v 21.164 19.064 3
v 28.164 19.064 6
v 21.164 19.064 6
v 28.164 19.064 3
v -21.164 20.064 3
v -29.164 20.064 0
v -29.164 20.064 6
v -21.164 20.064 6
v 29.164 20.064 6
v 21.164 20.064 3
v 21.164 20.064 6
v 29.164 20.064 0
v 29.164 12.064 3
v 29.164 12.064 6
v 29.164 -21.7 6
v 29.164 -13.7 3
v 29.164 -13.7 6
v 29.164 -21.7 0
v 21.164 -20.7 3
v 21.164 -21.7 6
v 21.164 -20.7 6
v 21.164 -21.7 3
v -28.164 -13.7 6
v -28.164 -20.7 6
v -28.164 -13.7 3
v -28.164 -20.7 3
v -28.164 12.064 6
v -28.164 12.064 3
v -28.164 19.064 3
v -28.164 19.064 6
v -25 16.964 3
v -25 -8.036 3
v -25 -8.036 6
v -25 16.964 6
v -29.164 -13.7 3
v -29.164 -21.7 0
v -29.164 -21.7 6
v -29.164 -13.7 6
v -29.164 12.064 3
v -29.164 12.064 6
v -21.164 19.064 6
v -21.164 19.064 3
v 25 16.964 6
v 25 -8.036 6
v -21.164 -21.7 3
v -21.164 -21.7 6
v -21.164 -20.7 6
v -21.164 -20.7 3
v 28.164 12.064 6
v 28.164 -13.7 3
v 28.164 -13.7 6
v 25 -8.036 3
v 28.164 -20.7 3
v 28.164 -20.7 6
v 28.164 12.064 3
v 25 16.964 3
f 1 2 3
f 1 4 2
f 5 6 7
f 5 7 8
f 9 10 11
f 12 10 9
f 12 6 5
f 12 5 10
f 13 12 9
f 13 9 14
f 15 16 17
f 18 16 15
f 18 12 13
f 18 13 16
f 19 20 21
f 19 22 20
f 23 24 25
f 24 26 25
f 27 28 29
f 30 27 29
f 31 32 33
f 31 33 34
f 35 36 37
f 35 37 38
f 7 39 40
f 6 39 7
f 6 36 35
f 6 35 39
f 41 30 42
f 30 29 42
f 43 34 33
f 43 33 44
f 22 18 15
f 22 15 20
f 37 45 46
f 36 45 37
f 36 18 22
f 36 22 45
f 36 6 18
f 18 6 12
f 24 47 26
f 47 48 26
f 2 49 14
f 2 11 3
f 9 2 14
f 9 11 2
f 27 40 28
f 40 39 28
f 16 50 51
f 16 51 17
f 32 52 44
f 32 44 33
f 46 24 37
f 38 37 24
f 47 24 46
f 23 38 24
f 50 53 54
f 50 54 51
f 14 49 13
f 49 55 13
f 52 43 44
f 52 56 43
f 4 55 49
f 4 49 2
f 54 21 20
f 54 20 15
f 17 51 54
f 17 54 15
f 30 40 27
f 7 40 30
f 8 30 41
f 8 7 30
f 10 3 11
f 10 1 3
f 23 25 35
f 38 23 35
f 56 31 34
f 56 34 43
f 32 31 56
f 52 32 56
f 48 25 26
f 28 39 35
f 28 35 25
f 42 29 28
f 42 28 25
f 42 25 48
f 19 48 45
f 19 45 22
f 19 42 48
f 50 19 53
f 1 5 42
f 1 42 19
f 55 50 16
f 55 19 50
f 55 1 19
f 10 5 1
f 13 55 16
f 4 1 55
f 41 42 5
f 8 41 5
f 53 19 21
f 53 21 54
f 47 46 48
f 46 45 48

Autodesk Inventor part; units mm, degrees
ref_plane "YZ Plane" through (0, 0, 0) normal (1, 0, 0) x (0, 1, 0)
ref_plane "XZ Plane" through (0, 0, 0) normal (0, 1, 0) x (-1, 0, 0)
ref_plane "XY Plane" through (0, 0, 0) normal (0, 0, 1) x (1, 0, 0)
sketch "LCD-128X64BK_AG, LCD-128X64BK_AG_48" plane through (0, 0, 0) normal (0, 0, 1) x (1, 0, 0)
  line L0 (-29.1635, 20.0635) -> (29.1635, 20.0635)
  line L1 (29.1635, 20.0635) -> (29.1635, -21.7)
  line L2 (29.1635, -21.7) -> (-29.1635, -21.7)
  line L3 (-29.1635, -21.7) -> (-29.1635, 20.0635)
extrude "Extrusion1" add sketch "LCD-128X64BK_AG, LCD-128X64BK_AG_48" along normal blind 3
sketch "Skizze2" plane through (0, 0, 3) normal (0, 0, 1) x (1, 0, 0)
  line L0 (29.1635, 20.0635) -> (-29.1635, 20.0635) construction
  line L1 (-29.1635, 20.0635) -> (-29.1635, -21.7) construction
  line L2 (-29.1635, -21.7) -> (29.1635, -21.7) construction
  line L3 (29.1635, -21.7) -> (29.1635, 20.0635) construction
  line L4 (-29.1635, 20.0635) -> (-29.1635, -21.7) projected
  line L5 (-29.1635, 20.0635) -> (-29.1635, 12.0635)
  line L6 (-29.1635, 12.0635) -> (-28.1635, 12.0635)
  line L7 (-28.1635, 12.0635) -> (-28.1635, 19.0635)
  line L8 (-28.1635, 19.0635) -> (-21.1635, 19.0635)
  line L9 (-21.1635, 19.0635) -> (-21.1635, 20.0635)
  line L10 (29.1635, 20.0635) -> (-29.1635, 20.0635) projected
  line L11 (-29.1635, 20.0635) -> (-21.1635, 20.0635)
  line L12 (-29.1635, -21.7) -> (-21.1635, -21.7)
  line L13 (-29.1635, -21.7) -> (29.1635, -21.7) projected
  line L14 (-21.1635, -21.7) -> (-21.1635, -20.7)
  line L15 (-21.1635, -20.7) -> (-28.1635, -20.7)
  line L16 (-28.1635, -20.7) -> (-28.1635, -13.7)
  line L17 (-28.1635, -13.7) -> (-29.1635, -13.7)
  line L18 (-29.1635, -21.7) -> (-29.1635, -13.7)
  line L19 (29.1635, -21.7) -> (29.1635, 20.0635) projected
  line L20 (29.1635, -21.7) -> (21.1635, -21.7)
  line L21 (21.1635, -21.7) -> (21.1635, -20.7)
  line L22 (21.1635, -20.7) -> (28.1635, -20.7)
  line L23 (28.1635, -20.7) -> (28.1635, -13.7)
  line L24 (28.1635, -13.7) -> (29.1635, -13.7)
  line L25 (29.1635, -21.7) -> (29.1635, -13.7)
  line L26 (21.1635, 20.0635) -> (29.1635, 20.0635)
  line L27 (29.1635, 20.0635) -> (29.1635, 12.0635)
  line L28 (28.1635, 12.0635) -> (28.1635, 19.0635)
  line L29 (28.1635, 19.0635) -> (21.1635, 19.0635)
  line L30 (21.1635, 19.0635) -> (21.1635, 20.0635)
  line L31 (28.1635, 12.0635) -> (29.1635, 12.0635)
  point P0 (0, 0)
  dimension "d2" = 8
  dimension "d3" = 1
  dimension "d4" = 7
  dimension "d5" = 7
  dimension "d6" = 8
  dimension "d7" = 1
  dimension "d8" = 7
  dimension "d9" = 7
  dimension "d10" = 8
  dimension "d11" = 1
  dimension "d12" = 7
  dimension "d13" = 7
  dimension "d14" = 8
  dimension "d15" = 8
  dimension "d16" = 7
  dimension "d17" = 7
extrude "Extrusion2" add sketch "Skizze2" along normal blind 3 contours L10 L9 L8 L7 L6 L4 | L17 L16 L15 L14 L12 L4 | L10 L19 L31 L28 L29 L30 | L21 L22 L23 L24 L19 L13
sketch "Skizze3" plane through (0, 0, 3) normal (0, 0, 1) x (1, 0, 0)
  line L0 (-25, 16.9635) -> (25, 16.9635)
  line L1 (25, 16.9635) -> (25, -8.0365)
  line L2 (25, -8.0365) -> (-25, -8.0365)
  line L3 (-25, -8.0365) -> (-25, 16.9635)
  line L4 (-40.8289, 0) -> (40.8289, 0) construction
  line L5 (0, -30.0527) -> (0, 28.4162) construction
  line L6 (-21.1635, -20.7) -> (-21.1635, -21.7) construction
  line L7 (-21.1635, -21.7) -> (21.1635, -21.7) construction
  line L8 (21.1635, -21.7) -> (21.1635, -20.7) construction
  line L9 (21.1635, -20.7) -> (28.1635, -20.7) construction
  line L10 (28.1635, -20.7) -> (28.1635, -13.7) construction
  line L11 (28.1635, -13.7) -> (29.1635, -13.7) construction
  line L12 (29.1635, -13.7) -> (29.1635, 12.0635) construction
  line L13 (29.1635, 12.0635) -> (28.1635, 12.0635) construction
  line L14 (28.1635, 12.0635) -> (28.1635, 19.0635) construction
  line L15 (28.1635, 19.0635) -> (21.1635, 19.0635) construction
  line L16 (21.1635, 19.0635) -> (21.1635, 20.0635) construction
  line L17 (21.1635, 20.0635) -> (-21.1635, 20.0635) construction
  line L18 (-21.1635, 20.0635) -> (-21.1635, 19.0635) construction
  line L19 (-21.1635, 19.0635) -> (-28.1635, 19.0635) construction
  line L20 (-28.1635, 19.0635) -> (-28.1635, 12.0635) construction
  line L21 (-28.1635, 12.0635) -> (-29.1635, 12.0635) construction
  line L22 (-29.1635, 12.0635) -> (-29.1635, -13.7) construction
  line L23 (-29.1635, -13.7) -> (-28.1635, -13.7) construction
  line L24 (-28.1635, -13.7) -> (-28.1635, -20.7) construction
  line L25 (-28.1635, -20.7) -> (-21.1635, -20.7) construction
  point P0 (0, 0)
  point P1 (0, 16.9635)
  dimension "d20" = 3.1
  dimension "d21" = 25
  dimension "d22" = 50
extrude "Extrusion3" add sketch "Skizze3" along normal blind 3 separate body
properties part number "LCD-128X64BK_AG"
